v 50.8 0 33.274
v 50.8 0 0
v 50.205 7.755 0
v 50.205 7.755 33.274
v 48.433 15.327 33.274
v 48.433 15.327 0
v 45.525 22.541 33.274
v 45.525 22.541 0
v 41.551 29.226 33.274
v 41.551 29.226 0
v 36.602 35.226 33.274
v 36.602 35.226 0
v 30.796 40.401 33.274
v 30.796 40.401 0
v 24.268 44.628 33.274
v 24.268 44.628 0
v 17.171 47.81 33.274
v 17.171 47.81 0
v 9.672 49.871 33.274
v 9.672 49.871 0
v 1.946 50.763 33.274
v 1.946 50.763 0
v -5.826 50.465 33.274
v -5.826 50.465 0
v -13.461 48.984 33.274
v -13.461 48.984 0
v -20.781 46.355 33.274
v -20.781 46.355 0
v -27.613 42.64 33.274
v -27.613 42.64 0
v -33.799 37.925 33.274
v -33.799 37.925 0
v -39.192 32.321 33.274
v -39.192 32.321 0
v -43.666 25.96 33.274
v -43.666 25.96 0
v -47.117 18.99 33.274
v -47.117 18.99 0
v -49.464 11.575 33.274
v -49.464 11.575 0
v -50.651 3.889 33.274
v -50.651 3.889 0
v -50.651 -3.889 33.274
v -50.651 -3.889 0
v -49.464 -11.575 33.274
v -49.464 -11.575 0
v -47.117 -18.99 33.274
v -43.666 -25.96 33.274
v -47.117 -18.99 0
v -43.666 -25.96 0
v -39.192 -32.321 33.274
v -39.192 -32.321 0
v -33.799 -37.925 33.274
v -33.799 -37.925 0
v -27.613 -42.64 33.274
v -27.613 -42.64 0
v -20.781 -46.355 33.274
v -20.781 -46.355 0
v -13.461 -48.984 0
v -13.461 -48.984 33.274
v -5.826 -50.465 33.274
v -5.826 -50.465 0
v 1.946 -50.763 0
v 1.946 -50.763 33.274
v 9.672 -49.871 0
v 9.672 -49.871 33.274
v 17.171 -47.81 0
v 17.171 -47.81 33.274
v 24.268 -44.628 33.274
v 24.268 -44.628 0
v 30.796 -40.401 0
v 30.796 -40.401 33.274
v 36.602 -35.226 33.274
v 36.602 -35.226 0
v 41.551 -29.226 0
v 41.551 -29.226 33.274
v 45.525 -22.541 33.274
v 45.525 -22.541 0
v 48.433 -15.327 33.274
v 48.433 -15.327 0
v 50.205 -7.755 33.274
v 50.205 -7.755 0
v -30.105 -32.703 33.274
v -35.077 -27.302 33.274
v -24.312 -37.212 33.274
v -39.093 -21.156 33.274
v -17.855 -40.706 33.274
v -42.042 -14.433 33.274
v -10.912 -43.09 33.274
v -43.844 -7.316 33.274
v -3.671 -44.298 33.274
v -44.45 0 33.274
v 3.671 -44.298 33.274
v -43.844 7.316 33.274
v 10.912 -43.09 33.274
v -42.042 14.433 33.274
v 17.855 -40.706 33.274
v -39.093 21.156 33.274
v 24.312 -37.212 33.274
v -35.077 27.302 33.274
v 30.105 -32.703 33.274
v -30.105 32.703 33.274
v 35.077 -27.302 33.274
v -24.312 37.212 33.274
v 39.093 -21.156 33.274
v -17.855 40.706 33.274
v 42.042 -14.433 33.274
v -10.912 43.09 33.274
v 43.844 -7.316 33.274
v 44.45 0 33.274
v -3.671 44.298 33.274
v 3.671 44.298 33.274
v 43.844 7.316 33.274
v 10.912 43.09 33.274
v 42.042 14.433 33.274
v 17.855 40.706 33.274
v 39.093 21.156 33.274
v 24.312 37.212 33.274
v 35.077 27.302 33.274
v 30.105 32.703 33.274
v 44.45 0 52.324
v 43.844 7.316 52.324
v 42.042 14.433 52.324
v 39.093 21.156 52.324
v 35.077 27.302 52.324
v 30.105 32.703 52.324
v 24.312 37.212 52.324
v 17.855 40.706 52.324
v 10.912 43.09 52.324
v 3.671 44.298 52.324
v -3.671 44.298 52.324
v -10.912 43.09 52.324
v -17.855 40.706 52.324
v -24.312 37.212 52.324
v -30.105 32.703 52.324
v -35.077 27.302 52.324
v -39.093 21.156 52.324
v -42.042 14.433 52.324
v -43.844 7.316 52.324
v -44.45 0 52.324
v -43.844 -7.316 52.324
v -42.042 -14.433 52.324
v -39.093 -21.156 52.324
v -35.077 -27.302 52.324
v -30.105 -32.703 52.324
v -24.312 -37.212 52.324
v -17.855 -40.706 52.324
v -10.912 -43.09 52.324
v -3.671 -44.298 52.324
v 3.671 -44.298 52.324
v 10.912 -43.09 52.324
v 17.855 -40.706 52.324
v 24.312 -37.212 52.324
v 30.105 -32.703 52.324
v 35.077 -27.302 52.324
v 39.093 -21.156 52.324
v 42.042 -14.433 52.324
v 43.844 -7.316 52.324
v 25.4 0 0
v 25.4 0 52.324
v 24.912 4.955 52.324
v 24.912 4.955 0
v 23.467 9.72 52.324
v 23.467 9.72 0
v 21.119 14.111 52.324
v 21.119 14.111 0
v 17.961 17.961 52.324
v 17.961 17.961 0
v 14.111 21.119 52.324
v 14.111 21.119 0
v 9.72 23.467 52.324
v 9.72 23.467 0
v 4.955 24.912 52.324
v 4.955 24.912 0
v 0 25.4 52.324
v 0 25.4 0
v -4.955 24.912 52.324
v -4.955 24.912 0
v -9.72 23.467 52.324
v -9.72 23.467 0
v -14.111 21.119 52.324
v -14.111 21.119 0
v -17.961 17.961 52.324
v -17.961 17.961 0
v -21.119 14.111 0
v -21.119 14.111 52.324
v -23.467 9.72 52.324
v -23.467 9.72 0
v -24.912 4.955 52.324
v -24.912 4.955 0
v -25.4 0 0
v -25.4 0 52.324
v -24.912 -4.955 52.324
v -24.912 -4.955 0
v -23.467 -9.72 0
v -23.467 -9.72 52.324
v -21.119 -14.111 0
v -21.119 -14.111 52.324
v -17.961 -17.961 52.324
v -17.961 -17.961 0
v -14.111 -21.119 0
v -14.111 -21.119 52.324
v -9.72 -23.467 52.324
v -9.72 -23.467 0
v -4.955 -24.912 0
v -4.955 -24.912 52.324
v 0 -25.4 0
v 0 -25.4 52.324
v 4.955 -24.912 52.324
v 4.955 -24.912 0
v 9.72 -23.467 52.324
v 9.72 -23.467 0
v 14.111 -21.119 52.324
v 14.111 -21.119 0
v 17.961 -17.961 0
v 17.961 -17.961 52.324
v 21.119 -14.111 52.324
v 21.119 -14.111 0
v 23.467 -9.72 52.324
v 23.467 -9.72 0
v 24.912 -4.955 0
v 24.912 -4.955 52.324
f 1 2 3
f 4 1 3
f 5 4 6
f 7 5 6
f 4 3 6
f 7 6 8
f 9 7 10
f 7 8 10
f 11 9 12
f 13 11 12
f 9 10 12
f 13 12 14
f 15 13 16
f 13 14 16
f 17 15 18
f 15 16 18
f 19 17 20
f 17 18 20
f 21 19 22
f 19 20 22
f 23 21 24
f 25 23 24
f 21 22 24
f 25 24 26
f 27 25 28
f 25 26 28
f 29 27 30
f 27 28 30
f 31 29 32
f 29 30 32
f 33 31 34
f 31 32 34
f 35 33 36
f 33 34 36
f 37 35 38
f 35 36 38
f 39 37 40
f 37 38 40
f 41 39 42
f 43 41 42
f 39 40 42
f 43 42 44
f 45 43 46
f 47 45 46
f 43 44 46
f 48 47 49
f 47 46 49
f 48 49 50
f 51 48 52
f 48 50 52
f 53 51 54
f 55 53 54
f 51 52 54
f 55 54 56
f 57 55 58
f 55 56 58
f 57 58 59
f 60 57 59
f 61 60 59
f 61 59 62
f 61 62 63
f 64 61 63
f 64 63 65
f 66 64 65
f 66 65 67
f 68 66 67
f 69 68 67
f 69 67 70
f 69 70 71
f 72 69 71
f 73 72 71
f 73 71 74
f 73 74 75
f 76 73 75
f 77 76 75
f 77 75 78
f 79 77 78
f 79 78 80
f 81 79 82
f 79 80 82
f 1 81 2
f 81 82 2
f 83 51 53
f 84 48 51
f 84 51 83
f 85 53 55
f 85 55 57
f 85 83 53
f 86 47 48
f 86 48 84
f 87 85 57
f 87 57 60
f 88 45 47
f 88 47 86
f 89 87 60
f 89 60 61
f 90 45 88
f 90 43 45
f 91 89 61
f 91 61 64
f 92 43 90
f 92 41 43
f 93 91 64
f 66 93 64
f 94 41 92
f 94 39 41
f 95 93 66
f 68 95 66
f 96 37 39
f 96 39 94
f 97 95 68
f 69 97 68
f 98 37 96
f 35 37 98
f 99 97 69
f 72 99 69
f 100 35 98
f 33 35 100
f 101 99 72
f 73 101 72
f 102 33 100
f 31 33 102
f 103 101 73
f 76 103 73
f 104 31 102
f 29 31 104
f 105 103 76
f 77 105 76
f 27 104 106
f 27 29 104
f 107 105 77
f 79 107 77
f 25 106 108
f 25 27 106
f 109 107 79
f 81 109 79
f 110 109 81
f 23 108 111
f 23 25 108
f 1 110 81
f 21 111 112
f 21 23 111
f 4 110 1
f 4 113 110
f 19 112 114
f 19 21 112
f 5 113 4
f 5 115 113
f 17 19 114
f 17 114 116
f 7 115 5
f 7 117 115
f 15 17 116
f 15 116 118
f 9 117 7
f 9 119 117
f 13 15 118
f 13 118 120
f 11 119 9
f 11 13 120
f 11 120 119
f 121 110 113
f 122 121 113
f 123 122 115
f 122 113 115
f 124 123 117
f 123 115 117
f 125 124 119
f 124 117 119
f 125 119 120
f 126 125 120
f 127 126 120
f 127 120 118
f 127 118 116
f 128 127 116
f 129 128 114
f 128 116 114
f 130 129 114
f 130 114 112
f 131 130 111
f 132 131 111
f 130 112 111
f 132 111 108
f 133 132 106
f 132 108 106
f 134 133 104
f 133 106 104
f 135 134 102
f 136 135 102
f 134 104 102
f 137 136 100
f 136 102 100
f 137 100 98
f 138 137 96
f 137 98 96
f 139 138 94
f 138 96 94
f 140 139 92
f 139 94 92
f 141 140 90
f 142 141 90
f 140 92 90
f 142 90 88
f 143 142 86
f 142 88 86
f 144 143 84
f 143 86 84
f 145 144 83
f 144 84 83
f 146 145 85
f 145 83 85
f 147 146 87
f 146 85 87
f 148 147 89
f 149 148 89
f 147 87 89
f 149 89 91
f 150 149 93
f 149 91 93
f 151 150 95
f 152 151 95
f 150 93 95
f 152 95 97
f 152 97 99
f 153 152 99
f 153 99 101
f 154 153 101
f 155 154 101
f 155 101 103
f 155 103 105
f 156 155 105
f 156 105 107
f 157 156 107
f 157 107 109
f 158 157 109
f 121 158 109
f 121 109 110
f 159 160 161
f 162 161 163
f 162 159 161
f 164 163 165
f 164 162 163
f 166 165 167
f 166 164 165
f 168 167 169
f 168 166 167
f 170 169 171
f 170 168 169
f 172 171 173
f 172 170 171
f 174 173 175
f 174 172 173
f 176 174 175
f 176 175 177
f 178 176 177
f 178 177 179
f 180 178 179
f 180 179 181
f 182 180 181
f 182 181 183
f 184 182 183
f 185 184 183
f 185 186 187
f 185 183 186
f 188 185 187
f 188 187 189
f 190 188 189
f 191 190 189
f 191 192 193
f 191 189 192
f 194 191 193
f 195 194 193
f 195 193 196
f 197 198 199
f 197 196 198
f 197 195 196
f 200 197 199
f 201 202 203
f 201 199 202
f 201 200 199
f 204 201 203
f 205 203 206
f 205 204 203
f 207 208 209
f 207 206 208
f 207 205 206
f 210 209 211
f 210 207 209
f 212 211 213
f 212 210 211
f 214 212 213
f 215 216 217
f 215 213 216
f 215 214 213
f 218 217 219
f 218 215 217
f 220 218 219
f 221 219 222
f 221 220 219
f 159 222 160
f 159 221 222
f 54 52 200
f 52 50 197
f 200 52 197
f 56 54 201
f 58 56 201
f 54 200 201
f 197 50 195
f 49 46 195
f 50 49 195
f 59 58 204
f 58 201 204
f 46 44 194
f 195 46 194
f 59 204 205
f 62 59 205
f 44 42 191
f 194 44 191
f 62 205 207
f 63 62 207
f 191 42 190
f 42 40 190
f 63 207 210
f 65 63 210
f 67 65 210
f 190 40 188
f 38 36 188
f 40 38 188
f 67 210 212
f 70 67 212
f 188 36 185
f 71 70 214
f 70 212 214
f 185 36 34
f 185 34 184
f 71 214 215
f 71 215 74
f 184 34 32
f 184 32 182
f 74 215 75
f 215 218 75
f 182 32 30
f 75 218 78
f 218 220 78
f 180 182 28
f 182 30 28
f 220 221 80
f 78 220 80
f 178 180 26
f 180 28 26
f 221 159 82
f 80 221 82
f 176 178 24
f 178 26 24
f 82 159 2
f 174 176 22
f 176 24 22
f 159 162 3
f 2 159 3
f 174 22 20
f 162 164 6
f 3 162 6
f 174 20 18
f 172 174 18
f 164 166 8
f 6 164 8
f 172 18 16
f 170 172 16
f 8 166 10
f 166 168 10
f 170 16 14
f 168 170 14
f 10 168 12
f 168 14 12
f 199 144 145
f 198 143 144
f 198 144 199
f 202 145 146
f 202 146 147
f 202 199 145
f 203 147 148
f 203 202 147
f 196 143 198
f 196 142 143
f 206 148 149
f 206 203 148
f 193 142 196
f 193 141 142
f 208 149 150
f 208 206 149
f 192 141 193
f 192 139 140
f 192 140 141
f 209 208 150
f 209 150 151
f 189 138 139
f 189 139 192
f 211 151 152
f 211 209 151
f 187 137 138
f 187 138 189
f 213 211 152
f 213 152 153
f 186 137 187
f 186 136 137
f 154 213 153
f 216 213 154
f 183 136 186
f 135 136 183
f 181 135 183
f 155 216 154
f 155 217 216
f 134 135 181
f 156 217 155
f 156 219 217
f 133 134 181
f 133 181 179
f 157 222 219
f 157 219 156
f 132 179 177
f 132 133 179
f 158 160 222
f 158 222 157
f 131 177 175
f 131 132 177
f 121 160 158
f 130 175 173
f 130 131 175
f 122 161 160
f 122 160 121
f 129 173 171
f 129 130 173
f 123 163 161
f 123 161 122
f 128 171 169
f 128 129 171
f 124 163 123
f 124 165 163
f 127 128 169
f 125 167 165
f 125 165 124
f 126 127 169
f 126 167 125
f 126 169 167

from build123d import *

# Parameters (mm, degrees)
SKETCH1_R           = 50.8
BOSS_EXTRUDE1_DEPTH = 33.274
SKETCH3_R           = 44.45
BOSS_EXTRUDE2_DEPTH = 19.05
SKETCH5_R           = 25.4
CUT_EXTRUDE1_DEPTH  = 53.324


with BuildPart() as part:
    # Sketch1 → Boss-Extrude1 (new body)
    with BuildSketch(Plane.XY):
        Circle(SKETCH1_R)
    extrude(amount=BOSS_EXTRUDE1_DEPTH)

    # Sketch3 → Boss-Extrude2 (add)
    with BuildSketch(Plane.XY.offset(33.274)):
        Circle(SKETCH3_R)
    extrude(amount=BOSS_EXTRUDE2_DEPTH)

    # Sketch5 → Cut-Extrude1 (cut, through all)
    with BuildSketch(Plane.XY):
        Circle(SKETCH5_R)
    extrude(amount=CUT_EXTRUDE1_DEPTH, mode=Mode.SUBTRACT)


solid = part.part
